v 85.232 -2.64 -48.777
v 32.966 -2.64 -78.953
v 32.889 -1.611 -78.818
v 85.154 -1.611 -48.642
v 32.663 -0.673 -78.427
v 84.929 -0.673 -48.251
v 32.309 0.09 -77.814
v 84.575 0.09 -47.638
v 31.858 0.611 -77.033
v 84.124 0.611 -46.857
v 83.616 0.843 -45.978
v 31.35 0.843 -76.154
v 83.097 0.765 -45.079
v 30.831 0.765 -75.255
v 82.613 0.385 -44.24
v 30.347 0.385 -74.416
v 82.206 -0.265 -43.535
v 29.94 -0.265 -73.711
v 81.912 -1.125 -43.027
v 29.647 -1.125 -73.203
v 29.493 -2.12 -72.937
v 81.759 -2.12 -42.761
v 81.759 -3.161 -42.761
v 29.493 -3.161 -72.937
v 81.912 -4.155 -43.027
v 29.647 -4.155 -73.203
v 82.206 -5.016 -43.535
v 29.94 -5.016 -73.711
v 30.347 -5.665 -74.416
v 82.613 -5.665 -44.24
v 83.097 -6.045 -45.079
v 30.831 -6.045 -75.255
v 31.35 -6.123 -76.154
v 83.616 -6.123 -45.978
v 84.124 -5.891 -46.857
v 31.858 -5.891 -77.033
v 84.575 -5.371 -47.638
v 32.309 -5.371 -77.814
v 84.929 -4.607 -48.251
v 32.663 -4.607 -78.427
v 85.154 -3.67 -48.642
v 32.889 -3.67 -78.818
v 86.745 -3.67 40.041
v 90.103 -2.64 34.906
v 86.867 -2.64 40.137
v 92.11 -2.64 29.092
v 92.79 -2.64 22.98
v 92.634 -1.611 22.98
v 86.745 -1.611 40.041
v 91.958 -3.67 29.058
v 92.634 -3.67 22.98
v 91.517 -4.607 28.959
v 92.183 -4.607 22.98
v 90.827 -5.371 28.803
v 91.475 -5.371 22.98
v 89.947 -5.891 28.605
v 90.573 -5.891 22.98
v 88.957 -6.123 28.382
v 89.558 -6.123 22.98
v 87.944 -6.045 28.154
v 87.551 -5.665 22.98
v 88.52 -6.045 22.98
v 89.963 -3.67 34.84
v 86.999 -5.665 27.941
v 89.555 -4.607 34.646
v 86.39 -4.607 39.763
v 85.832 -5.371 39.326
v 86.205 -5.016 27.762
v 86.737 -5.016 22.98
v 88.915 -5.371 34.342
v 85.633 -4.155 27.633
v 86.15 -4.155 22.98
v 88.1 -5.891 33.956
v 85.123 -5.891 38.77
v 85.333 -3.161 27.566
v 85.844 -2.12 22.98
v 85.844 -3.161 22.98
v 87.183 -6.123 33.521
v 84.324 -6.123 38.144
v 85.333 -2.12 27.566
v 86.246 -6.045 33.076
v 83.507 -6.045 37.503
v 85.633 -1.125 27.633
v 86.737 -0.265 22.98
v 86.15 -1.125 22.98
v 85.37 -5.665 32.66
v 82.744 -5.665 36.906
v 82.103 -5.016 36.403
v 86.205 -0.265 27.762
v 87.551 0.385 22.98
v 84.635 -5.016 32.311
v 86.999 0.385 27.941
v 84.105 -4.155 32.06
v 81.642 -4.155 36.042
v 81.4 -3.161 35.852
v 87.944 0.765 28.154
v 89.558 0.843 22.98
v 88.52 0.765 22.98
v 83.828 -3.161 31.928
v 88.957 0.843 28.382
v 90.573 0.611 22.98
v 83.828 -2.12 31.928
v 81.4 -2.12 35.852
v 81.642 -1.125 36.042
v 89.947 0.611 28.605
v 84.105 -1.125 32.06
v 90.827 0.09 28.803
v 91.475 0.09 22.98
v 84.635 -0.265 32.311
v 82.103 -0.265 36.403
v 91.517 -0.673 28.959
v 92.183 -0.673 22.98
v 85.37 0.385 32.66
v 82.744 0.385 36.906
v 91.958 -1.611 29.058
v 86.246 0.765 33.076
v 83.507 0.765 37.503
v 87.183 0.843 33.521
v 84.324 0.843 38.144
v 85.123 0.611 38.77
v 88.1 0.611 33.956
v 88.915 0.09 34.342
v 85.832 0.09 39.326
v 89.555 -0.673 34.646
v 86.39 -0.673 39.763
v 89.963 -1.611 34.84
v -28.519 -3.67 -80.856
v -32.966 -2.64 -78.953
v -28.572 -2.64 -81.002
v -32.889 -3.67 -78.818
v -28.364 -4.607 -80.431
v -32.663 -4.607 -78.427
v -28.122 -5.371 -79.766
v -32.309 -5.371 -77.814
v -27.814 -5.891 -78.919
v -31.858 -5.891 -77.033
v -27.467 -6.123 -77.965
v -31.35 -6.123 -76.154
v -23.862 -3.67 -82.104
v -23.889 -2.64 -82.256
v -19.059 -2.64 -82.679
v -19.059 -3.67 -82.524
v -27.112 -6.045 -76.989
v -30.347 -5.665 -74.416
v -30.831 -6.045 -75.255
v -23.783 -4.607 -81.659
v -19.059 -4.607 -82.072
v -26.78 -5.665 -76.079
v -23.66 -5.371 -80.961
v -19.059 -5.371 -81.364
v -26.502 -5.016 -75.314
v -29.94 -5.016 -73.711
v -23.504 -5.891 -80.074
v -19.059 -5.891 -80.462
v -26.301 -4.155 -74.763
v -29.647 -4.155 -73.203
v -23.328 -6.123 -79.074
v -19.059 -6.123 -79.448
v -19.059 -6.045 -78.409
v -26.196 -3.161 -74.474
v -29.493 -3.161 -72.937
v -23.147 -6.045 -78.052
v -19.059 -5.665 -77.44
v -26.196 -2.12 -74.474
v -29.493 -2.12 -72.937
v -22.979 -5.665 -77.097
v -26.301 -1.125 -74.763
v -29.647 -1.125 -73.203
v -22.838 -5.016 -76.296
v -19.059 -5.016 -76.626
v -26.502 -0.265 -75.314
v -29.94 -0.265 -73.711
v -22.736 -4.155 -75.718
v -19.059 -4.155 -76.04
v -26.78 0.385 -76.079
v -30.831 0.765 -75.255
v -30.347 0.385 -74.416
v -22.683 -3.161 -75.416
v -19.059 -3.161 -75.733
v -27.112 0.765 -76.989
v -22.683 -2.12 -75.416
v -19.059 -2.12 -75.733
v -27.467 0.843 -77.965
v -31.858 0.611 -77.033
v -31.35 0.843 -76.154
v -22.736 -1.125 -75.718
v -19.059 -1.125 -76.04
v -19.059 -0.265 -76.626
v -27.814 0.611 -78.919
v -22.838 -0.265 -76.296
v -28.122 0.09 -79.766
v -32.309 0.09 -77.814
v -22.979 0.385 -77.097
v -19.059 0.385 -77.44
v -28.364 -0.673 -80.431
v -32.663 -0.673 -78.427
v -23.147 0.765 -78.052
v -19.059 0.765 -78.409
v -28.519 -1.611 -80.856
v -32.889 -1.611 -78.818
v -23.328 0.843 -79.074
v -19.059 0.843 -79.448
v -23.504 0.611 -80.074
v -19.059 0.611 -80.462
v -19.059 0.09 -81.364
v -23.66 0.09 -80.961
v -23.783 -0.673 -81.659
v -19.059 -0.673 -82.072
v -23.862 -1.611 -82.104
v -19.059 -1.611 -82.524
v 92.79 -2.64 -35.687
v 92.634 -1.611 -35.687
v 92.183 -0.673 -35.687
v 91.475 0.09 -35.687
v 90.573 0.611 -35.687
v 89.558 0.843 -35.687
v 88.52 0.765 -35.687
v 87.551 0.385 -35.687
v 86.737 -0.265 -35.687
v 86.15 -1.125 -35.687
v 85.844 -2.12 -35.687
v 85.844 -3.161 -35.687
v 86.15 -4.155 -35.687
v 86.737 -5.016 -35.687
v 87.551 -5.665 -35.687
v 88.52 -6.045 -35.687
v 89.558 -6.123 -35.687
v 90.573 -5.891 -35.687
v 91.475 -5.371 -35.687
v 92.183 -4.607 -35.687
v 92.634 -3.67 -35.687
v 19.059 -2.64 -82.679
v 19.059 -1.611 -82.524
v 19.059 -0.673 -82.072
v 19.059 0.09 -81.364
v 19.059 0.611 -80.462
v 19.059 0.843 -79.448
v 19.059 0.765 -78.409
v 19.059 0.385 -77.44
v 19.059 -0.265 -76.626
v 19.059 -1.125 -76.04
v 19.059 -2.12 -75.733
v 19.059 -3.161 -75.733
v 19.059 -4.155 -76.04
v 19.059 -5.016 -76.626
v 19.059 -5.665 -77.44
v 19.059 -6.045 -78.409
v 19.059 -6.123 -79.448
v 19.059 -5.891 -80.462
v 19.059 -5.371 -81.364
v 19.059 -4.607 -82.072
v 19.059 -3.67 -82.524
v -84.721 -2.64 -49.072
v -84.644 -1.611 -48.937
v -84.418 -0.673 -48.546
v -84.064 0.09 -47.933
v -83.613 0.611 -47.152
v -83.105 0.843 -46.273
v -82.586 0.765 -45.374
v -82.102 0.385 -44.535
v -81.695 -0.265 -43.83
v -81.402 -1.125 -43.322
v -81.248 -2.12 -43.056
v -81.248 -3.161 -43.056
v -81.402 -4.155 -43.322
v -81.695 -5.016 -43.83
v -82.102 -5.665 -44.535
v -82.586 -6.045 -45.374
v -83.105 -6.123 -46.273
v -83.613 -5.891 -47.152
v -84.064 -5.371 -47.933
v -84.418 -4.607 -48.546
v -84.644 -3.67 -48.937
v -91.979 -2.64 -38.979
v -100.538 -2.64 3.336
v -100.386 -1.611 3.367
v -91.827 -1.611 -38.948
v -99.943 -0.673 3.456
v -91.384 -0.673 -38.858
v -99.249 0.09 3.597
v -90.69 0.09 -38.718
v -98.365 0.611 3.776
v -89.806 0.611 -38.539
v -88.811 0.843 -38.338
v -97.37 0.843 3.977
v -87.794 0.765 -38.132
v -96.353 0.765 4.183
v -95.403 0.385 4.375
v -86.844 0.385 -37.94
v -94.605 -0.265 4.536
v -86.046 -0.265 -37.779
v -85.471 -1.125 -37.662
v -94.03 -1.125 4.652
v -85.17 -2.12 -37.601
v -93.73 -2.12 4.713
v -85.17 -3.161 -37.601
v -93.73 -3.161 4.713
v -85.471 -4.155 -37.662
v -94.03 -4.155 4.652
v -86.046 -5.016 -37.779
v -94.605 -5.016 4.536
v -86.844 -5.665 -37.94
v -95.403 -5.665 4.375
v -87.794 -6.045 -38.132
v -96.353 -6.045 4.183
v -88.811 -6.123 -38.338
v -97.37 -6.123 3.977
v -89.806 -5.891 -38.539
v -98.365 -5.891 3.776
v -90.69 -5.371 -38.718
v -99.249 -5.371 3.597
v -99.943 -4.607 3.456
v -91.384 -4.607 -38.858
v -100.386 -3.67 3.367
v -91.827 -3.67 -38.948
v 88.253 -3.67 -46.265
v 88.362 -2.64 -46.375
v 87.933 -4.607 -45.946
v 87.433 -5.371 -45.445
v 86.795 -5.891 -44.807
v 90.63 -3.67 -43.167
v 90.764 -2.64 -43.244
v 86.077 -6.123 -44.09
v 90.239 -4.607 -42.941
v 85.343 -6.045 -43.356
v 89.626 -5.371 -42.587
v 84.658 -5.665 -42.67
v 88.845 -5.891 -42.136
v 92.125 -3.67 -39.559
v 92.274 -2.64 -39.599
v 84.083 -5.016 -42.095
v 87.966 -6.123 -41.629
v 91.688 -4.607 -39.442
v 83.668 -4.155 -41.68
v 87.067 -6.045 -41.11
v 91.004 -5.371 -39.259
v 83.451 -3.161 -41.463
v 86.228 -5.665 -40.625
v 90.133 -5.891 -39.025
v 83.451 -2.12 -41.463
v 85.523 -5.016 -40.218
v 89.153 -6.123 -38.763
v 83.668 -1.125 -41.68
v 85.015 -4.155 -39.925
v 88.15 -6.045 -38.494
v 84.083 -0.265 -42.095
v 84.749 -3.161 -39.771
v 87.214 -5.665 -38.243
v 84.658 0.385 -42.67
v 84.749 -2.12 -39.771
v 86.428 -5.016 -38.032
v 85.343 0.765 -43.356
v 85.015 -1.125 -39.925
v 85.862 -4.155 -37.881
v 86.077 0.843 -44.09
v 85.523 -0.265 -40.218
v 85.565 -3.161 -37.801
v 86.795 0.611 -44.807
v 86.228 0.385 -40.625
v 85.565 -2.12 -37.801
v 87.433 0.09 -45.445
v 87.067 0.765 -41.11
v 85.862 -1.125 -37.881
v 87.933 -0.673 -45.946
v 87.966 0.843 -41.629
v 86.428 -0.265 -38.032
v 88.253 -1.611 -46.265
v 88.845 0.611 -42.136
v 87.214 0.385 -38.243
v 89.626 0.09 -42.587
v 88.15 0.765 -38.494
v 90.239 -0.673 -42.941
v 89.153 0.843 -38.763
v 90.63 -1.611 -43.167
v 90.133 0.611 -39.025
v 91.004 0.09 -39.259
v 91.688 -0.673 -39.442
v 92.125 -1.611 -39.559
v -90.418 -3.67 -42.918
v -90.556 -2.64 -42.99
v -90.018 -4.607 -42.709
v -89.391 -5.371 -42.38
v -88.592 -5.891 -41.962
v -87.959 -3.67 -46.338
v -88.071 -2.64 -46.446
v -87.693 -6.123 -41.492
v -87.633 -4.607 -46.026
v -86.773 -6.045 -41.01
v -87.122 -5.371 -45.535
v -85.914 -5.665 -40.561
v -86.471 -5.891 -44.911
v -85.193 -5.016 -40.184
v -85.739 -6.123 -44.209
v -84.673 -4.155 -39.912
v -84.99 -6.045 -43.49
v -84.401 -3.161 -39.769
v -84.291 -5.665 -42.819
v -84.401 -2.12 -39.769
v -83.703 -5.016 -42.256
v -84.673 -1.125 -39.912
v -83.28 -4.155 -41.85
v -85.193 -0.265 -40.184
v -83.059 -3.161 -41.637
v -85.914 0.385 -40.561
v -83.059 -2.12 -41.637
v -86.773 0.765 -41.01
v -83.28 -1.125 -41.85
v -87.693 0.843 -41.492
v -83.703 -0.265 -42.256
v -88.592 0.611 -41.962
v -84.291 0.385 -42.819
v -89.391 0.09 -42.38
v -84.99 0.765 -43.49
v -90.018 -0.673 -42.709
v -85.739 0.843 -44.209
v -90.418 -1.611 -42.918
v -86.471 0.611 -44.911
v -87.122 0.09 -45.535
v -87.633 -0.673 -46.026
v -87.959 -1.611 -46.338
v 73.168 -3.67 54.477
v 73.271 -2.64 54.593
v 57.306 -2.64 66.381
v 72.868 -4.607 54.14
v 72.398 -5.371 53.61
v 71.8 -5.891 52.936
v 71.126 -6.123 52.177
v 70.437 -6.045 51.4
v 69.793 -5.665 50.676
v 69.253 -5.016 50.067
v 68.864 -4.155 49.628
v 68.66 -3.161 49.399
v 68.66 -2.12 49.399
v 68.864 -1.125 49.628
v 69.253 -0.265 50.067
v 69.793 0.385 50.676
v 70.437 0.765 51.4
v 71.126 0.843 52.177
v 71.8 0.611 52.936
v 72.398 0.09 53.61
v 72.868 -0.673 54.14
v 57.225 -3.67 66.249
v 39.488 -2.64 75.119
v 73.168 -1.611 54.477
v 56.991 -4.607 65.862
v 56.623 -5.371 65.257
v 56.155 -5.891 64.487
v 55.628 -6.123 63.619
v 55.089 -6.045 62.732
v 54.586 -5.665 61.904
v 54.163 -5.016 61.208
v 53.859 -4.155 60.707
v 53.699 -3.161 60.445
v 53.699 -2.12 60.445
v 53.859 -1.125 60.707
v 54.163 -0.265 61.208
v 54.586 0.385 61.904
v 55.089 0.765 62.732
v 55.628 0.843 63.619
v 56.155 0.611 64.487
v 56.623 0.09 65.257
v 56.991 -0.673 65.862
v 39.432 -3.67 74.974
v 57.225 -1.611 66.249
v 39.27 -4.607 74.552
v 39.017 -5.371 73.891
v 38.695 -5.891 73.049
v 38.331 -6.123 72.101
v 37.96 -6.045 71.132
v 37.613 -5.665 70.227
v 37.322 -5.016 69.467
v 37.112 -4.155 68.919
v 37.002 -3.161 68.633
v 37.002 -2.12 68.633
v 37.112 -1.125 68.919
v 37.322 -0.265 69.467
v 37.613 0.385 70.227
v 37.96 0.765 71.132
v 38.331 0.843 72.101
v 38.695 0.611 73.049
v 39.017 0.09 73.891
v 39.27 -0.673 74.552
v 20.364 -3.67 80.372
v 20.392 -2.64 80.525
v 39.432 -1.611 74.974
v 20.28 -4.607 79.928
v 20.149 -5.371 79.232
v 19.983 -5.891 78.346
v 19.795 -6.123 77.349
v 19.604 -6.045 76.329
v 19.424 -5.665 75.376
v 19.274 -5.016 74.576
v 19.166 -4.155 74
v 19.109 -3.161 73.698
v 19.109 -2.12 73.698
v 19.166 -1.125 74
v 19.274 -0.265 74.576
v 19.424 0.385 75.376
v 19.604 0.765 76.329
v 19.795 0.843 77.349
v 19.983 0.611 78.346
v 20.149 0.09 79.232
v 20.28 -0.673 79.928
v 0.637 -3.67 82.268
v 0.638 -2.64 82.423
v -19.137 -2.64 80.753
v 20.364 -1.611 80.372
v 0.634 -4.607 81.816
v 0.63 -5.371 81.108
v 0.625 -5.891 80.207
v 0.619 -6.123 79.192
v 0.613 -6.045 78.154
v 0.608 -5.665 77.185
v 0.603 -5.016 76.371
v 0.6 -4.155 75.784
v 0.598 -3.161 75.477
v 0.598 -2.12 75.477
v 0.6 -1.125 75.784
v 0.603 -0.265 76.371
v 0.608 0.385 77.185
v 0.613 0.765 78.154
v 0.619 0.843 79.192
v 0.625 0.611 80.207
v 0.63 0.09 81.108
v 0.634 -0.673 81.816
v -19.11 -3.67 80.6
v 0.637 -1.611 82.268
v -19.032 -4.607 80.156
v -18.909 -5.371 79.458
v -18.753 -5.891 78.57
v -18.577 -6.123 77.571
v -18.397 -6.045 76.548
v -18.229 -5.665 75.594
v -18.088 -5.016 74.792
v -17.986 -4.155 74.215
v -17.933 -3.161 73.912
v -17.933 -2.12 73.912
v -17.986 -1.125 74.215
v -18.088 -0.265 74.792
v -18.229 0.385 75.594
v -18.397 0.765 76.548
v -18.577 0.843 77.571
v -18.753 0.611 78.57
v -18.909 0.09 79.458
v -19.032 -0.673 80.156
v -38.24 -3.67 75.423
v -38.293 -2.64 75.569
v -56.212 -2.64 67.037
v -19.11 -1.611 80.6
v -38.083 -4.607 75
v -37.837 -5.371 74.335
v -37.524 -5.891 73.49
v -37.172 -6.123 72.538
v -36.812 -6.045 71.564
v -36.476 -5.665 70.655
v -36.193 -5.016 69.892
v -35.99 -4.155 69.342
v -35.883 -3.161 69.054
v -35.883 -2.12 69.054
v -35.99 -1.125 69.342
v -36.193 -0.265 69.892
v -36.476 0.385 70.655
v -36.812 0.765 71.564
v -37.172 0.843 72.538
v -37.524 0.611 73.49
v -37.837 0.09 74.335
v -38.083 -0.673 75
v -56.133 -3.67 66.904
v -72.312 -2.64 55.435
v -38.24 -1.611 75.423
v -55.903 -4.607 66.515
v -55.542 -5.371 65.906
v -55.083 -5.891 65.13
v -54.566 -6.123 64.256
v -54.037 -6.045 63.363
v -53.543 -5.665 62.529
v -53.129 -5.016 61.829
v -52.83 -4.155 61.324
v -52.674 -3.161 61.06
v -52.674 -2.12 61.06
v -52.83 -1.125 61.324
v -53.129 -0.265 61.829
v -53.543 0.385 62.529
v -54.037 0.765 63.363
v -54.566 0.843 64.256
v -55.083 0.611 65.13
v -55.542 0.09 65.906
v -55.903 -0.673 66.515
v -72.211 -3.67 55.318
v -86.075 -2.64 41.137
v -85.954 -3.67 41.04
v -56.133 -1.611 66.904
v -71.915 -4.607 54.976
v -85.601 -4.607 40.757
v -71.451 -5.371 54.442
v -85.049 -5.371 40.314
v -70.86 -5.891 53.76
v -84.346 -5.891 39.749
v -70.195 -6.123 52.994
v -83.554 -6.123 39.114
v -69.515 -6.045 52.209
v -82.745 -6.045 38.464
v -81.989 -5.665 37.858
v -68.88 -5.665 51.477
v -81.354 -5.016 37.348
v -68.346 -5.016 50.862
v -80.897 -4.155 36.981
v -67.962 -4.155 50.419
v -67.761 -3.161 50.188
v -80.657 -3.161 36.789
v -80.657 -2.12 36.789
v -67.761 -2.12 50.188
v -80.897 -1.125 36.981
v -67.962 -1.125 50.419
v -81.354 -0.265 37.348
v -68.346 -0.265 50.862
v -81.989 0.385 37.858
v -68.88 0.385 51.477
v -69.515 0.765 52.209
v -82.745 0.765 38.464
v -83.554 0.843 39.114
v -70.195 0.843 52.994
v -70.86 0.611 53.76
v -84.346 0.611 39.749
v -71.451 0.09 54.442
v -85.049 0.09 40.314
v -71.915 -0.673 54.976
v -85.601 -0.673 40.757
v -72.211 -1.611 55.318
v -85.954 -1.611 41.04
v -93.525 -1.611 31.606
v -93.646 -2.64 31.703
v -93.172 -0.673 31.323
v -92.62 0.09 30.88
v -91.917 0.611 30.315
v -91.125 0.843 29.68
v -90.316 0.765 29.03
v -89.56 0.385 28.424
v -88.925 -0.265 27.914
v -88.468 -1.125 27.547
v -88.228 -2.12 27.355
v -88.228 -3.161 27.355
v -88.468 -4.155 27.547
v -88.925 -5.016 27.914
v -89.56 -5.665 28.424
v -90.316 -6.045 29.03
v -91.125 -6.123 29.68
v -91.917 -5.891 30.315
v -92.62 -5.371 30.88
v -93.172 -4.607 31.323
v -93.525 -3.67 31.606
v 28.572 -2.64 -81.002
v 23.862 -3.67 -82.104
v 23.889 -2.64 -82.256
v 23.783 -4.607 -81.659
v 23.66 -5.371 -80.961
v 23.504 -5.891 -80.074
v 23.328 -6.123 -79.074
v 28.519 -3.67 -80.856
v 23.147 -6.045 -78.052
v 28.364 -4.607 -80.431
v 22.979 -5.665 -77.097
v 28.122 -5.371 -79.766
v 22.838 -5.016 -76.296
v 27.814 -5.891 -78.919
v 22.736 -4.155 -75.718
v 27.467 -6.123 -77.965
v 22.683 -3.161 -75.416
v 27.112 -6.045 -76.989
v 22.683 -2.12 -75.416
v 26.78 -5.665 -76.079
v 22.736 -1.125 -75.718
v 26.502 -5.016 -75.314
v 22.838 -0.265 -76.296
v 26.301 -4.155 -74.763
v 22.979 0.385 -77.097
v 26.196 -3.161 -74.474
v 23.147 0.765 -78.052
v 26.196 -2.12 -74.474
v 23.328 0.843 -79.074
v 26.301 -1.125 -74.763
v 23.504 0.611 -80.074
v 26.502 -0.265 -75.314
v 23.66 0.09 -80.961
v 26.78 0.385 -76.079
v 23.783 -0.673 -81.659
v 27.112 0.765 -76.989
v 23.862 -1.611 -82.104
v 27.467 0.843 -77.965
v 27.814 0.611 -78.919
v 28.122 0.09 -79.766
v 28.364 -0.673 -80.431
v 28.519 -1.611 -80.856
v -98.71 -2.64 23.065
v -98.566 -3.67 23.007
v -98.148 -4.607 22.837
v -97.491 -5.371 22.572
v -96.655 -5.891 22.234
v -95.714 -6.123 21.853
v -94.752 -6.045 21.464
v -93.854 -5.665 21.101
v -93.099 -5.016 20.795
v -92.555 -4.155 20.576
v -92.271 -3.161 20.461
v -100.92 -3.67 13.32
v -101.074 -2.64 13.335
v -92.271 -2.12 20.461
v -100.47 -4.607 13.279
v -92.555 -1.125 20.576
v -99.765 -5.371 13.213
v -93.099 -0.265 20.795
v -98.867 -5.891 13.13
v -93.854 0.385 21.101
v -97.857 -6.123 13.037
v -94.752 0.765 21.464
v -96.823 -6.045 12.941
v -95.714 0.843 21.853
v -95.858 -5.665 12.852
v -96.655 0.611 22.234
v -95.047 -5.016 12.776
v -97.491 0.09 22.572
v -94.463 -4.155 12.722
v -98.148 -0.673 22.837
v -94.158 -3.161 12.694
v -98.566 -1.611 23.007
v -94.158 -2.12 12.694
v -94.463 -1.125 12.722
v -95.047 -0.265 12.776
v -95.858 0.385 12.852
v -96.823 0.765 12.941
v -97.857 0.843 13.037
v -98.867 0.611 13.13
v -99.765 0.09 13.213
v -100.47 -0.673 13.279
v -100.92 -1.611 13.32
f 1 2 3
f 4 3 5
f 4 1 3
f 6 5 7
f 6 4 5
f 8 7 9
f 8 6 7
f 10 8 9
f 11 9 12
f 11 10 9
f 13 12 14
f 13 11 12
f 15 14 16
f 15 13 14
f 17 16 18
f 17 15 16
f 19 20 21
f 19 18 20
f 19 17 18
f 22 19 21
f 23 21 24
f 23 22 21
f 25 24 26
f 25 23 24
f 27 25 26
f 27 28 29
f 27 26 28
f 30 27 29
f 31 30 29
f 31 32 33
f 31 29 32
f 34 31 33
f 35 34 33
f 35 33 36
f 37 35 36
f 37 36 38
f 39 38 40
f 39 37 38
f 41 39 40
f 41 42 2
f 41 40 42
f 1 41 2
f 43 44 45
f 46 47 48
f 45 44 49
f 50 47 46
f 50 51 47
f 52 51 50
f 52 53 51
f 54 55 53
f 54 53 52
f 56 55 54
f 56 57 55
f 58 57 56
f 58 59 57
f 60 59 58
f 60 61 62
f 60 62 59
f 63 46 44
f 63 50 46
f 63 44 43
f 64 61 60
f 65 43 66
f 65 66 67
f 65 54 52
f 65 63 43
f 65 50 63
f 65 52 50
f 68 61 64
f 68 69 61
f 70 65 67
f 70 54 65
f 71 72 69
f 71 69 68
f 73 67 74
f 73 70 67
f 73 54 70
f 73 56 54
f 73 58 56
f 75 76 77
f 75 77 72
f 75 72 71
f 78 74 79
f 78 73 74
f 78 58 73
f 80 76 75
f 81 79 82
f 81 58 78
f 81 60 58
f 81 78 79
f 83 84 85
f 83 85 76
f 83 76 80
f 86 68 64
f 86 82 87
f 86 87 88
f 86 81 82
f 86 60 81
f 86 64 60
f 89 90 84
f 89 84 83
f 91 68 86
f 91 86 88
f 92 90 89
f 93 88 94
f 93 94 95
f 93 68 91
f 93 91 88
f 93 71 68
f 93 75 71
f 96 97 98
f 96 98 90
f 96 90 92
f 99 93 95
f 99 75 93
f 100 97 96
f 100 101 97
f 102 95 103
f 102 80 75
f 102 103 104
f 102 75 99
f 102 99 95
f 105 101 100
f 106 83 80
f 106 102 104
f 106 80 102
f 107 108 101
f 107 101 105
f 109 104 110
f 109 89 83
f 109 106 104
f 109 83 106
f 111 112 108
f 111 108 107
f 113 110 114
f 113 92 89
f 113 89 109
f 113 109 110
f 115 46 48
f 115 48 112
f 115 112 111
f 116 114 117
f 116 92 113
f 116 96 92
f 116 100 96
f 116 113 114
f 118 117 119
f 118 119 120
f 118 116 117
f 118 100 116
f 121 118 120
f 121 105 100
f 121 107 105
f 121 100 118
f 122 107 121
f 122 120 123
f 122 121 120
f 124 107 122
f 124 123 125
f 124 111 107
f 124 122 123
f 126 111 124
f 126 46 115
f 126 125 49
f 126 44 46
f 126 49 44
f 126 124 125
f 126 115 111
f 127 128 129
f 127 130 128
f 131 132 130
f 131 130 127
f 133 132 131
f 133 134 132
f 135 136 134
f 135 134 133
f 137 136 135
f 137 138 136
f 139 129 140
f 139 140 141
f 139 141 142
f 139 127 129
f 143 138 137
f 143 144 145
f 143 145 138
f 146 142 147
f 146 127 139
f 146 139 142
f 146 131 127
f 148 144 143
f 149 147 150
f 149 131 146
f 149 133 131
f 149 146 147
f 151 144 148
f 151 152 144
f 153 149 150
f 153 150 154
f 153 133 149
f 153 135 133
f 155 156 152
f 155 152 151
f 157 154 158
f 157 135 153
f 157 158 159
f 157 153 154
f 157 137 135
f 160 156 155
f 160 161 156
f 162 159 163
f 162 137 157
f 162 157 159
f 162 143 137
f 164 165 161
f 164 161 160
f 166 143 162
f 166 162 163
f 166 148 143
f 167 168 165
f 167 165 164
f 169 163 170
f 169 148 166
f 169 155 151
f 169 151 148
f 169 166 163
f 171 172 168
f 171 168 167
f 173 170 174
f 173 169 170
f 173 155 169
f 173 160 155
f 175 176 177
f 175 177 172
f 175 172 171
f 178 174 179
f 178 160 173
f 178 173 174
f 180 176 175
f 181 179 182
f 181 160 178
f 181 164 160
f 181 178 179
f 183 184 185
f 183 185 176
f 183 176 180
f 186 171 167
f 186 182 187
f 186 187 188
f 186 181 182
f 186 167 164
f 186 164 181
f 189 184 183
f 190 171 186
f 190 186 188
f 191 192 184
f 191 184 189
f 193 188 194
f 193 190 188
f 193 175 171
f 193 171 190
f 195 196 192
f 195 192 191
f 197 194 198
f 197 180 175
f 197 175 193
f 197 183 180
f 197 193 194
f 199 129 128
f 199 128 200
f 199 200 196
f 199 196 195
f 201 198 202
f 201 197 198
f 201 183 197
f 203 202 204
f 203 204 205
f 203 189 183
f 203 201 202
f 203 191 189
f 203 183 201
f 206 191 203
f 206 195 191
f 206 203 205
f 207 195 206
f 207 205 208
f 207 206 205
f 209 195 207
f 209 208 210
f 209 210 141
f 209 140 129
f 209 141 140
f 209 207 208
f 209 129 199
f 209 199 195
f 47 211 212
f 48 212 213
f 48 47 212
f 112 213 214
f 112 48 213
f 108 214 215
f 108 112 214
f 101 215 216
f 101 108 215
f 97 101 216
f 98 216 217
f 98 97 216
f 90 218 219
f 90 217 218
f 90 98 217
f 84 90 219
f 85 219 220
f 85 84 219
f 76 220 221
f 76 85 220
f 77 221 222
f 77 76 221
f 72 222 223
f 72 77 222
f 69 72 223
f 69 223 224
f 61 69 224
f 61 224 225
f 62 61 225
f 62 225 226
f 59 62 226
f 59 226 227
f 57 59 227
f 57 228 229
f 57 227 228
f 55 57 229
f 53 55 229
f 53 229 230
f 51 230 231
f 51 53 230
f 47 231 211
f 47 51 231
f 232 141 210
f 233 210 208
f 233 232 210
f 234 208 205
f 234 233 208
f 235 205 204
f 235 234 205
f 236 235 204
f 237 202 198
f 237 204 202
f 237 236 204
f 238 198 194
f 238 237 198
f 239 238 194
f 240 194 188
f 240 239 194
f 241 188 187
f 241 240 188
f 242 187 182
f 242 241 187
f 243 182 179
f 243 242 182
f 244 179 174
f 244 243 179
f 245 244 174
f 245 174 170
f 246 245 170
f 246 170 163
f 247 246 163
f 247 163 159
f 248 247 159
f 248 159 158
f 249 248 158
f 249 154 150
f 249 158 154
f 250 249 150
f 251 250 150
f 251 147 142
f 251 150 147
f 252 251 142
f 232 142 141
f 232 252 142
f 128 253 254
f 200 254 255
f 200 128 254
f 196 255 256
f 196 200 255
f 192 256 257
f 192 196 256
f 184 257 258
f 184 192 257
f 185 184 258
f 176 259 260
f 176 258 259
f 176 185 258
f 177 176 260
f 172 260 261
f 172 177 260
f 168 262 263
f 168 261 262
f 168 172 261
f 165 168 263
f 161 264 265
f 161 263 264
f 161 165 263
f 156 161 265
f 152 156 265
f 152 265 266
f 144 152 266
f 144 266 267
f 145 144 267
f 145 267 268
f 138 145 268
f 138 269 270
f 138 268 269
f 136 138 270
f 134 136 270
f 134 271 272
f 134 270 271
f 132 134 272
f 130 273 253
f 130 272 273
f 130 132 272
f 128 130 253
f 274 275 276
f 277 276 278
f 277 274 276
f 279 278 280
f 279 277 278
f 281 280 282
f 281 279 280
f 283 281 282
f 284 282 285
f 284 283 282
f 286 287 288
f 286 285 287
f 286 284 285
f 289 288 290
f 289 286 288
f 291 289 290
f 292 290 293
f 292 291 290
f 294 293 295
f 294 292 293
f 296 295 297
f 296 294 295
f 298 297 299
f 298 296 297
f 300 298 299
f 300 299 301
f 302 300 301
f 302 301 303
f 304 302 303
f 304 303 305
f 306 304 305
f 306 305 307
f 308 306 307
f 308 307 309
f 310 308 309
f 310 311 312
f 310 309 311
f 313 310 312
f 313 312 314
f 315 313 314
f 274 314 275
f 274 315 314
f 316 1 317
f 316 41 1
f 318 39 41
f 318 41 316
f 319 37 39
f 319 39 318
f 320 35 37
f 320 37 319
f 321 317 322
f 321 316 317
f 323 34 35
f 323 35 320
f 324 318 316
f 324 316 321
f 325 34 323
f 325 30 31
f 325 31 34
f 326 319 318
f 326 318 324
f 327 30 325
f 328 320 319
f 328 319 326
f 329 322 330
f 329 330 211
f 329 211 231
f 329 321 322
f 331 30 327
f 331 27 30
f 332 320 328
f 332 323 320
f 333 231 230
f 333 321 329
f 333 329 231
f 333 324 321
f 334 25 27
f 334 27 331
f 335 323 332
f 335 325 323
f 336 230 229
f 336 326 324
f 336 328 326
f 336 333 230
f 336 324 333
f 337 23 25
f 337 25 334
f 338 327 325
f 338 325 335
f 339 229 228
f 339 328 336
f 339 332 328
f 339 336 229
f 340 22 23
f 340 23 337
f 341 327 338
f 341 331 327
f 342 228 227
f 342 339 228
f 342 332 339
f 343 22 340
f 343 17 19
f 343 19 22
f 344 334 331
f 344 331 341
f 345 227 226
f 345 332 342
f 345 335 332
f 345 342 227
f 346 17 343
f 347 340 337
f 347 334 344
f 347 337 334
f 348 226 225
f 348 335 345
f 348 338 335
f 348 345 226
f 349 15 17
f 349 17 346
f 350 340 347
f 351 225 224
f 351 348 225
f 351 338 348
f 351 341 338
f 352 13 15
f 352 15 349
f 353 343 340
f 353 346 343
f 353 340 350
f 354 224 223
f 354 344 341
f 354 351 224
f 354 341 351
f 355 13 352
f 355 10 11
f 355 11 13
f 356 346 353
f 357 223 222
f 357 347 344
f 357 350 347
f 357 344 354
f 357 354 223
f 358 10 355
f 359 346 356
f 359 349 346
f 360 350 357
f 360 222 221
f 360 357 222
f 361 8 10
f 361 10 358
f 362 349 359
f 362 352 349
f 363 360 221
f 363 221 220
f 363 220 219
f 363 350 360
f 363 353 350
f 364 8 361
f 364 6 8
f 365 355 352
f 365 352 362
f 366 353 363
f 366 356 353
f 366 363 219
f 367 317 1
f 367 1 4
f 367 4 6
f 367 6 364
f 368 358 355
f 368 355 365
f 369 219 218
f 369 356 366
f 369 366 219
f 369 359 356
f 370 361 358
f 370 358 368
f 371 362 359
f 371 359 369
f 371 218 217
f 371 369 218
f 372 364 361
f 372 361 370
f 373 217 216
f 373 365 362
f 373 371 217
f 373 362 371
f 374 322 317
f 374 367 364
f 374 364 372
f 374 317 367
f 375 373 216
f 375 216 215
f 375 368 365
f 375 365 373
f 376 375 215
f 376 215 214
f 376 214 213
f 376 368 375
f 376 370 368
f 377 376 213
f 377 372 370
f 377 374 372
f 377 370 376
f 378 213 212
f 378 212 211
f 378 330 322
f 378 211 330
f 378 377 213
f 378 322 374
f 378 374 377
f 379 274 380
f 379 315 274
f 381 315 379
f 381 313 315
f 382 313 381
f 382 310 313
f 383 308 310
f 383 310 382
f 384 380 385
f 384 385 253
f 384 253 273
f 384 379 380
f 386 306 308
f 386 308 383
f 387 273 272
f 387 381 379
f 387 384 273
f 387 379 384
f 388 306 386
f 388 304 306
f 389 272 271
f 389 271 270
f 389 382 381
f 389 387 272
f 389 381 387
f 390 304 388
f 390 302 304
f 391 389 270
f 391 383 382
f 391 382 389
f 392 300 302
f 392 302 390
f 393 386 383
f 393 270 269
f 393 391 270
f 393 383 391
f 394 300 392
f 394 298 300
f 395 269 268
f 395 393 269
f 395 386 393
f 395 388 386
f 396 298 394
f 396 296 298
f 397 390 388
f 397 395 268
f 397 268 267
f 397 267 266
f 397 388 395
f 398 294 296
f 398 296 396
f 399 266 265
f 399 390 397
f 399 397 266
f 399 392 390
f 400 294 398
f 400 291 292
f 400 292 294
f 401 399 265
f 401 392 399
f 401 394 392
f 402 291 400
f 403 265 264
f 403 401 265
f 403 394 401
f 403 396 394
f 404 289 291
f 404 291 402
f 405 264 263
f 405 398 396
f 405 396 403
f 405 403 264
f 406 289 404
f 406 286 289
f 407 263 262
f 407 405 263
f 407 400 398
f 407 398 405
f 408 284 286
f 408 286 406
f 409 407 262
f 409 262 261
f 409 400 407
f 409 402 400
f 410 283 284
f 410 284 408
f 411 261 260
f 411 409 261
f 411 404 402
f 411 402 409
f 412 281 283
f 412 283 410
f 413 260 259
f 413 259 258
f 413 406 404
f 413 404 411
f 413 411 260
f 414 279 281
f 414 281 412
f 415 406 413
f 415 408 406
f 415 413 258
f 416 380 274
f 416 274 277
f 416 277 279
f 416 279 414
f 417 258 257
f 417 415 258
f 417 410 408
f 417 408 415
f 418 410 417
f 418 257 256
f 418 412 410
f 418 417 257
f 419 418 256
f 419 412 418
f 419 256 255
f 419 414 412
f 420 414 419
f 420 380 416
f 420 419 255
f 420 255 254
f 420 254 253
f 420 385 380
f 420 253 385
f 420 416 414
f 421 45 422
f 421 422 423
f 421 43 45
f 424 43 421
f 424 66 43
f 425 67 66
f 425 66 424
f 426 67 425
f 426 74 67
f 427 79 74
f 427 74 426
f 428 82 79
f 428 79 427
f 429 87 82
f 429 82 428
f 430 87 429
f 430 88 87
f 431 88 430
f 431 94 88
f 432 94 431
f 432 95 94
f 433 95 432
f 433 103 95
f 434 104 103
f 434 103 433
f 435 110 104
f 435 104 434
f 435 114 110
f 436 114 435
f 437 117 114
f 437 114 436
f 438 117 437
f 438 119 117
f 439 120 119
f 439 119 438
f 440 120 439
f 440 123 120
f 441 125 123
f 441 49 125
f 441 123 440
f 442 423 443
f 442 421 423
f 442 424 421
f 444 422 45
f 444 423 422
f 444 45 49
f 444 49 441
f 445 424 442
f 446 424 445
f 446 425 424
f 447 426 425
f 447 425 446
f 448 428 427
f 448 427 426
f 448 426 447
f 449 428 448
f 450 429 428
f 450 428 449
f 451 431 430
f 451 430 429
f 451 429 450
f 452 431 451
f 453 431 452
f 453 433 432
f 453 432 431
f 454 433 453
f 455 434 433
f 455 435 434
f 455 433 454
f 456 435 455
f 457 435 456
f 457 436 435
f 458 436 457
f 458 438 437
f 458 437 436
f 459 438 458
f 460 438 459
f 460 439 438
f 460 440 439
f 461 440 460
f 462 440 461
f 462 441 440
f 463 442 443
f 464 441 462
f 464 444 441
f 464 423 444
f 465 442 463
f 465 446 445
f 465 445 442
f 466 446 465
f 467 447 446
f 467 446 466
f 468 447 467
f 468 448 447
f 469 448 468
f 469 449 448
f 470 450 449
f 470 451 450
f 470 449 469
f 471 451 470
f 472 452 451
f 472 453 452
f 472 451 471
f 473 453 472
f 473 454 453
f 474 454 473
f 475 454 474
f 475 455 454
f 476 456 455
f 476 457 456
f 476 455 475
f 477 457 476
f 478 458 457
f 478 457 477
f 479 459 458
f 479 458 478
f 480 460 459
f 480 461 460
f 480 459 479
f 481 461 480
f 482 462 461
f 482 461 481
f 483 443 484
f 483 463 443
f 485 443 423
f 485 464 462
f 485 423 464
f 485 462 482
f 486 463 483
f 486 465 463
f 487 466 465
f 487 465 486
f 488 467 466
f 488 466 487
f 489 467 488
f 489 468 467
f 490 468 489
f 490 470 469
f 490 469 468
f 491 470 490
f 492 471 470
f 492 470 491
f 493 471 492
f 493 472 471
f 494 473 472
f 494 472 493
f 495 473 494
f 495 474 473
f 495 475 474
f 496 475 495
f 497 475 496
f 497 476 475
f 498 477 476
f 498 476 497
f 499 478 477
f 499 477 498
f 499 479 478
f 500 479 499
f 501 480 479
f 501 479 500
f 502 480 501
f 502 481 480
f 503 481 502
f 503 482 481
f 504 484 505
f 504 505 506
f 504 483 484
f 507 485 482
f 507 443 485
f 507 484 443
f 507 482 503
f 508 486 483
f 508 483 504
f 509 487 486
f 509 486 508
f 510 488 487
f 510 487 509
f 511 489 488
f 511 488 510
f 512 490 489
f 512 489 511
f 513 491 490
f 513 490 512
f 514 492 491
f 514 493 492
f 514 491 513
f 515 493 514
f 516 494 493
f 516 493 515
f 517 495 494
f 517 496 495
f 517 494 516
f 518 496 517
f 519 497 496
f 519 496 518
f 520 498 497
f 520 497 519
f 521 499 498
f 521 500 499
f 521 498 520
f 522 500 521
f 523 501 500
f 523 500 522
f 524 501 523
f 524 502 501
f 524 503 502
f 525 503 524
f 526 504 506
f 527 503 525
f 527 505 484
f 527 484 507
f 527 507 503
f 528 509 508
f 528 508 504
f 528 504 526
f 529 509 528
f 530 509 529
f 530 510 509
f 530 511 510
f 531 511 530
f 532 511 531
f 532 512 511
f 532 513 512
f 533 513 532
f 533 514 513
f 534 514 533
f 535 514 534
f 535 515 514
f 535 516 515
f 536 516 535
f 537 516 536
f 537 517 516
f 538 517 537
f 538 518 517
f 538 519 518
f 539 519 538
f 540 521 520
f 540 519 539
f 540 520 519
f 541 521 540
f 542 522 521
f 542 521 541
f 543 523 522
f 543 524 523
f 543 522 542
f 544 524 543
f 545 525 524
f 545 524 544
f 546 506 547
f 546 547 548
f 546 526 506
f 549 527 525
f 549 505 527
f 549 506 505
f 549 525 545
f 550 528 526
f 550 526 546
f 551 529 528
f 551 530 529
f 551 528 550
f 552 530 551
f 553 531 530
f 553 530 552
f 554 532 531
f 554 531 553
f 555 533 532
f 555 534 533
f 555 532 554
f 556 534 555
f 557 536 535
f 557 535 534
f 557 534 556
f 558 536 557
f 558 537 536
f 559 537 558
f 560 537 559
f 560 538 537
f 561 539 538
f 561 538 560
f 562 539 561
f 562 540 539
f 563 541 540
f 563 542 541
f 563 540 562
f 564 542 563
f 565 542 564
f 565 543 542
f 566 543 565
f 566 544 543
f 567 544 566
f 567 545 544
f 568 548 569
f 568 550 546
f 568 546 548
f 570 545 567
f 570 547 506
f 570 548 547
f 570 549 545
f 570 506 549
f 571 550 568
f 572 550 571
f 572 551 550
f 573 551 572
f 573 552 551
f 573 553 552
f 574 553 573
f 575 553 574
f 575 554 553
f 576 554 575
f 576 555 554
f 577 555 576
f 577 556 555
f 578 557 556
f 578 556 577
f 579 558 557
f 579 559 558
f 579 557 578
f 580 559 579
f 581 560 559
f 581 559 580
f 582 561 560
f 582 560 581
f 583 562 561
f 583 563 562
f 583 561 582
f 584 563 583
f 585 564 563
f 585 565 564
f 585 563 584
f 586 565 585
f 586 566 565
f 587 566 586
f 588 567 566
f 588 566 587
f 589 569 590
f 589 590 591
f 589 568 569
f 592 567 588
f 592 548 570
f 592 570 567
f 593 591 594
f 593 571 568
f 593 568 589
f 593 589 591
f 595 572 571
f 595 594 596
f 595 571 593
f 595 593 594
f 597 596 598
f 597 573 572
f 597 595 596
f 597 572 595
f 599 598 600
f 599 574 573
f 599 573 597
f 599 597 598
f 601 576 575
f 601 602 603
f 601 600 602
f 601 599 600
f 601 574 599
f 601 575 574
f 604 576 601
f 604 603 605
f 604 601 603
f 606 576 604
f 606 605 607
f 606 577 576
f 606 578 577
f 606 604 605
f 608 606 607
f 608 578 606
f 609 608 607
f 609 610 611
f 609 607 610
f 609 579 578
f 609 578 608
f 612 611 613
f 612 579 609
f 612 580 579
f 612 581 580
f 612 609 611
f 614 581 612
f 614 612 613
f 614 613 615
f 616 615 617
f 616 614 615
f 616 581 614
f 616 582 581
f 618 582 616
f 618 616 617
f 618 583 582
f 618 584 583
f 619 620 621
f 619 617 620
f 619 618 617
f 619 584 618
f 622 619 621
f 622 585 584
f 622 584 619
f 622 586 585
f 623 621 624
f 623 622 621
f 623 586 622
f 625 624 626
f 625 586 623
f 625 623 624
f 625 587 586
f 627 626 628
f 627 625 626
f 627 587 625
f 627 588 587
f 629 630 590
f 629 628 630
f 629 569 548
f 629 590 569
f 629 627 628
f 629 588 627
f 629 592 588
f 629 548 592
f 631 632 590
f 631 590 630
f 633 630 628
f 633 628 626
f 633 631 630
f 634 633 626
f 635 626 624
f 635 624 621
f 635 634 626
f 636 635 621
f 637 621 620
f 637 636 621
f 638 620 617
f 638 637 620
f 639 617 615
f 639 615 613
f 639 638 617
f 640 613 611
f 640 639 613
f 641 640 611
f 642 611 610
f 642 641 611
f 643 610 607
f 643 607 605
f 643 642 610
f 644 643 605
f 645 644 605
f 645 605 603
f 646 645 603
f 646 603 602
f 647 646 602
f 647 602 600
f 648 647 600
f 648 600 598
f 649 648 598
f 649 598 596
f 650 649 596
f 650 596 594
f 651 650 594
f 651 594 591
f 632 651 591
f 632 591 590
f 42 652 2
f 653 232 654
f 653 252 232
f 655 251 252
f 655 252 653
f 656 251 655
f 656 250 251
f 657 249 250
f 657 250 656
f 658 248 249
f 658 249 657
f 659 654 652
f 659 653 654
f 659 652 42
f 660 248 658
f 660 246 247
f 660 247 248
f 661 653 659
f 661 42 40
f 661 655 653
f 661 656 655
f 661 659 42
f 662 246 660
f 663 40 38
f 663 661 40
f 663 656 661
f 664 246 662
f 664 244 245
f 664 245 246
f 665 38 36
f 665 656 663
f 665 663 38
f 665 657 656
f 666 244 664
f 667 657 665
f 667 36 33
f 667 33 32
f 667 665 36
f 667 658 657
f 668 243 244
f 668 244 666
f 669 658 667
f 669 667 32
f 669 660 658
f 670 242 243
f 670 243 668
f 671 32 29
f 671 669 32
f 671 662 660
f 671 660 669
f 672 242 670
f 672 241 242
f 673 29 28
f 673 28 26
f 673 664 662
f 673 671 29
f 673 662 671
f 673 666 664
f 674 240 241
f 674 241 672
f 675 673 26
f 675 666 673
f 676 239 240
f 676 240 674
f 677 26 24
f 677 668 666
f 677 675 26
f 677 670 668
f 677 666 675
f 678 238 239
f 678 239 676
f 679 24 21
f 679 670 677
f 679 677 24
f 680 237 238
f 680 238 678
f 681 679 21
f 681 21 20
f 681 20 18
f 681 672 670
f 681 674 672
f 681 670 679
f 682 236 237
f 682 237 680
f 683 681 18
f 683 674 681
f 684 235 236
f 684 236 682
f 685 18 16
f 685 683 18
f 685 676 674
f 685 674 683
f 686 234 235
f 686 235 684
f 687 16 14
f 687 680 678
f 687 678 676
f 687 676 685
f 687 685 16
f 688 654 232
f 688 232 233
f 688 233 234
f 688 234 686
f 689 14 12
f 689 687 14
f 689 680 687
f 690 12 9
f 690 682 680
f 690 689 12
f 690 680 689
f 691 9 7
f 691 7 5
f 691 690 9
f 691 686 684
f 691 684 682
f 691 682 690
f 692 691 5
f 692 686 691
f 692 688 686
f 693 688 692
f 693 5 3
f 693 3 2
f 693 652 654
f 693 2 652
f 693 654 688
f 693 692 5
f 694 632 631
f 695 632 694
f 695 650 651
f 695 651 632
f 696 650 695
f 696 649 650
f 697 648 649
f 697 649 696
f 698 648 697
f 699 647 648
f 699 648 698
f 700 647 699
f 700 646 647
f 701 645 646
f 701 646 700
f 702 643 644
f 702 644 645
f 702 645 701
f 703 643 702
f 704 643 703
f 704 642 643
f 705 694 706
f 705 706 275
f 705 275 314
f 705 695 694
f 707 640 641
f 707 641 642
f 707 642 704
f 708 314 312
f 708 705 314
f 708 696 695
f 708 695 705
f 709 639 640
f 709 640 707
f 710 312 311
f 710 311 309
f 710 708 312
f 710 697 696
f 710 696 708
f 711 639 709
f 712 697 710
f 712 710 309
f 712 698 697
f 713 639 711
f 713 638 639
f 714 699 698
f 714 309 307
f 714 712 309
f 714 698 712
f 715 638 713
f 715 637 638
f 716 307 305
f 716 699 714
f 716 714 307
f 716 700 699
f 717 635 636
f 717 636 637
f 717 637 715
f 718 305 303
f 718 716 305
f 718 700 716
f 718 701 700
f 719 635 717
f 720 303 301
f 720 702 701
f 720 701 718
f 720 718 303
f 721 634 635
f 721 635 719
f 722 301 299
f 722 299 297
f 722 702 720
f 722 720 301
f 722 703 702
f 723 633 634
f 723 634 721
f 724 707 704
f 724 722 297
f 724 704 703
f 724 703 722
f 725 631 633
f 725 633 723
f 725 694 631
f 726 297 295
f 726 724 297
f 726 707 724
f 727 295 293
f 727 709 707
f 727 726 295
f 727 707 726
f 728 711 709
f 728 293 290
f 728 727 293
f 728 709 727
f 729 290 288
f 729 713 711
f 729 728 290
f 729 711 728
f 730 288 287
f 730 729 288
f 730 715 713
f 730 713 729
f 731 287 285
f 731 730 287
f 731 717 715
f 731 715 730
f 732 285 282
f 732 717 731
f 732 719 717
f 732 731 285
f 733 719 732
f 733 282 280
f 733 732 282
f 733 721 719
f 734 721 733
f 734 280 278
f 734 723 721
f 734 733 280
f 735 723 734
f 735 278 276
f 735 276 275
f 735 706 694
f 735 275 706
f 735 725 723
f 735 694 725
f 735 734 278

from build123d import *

# Parameters (mm, degrees)
SKETCH2_R = 3.4925


with BuildPart() as part:
    # Sweep1: sweep along a path in Sketch1
    with BuildLine(Plane(origin=(0, -2.640079968, 0), x_dir=(-1, 0, 0), z_dir=(0, -1, 0))) as sweep1_path:
        Line((83.350830382, -38.950762016), (90.921866986, -29.516691169))
        ThreePointArc((90.921866986, -29.516691169), (96.854212201, -17.461644901), (97.114610152, -4.028512237))
        Line((97.114610152, -4.028512237), (88.555415825, 38.286098976))
        ThreePointArc((88.555415825, 38.286098976), (86.599981286, 42.766938519), (82.974870066, 46.04721532))
        Line((82.974870066, 46.04721532), (31.21997499, 75.927917924))
        ThreePointArc((31.21997499, 75.927917924), (25.353847026, 78.357747685), (19.058716307, 79.186517367))
        Line((19.058716307, 79.186517367), (-19.058716307, 79.186517367))
        ThreePointArc((-19.058716307, 79.186517367), (-25.353847026, 78.357747685), (-31.21997499, 75.927917924))
        Line((-31.21997499, 75.927917924), (-83.485748808, 45.752259341))
        ThreePointArc((-83.485748808, 45.752259341), (-87.73988542, 41.498122729), (-89.297007491, 35.686864045))
        Line((-89.297007491, 35.686864045), (-89.297007491, -22.979722438))
        ThreePointArc((-89.297007491, -22.979722438), (-87.965976384, -30.91549024), (-84.118562377, -37.98270043))
        ThreePointArc((-84.118562377, -37.98270043), (-0.617769304, -78.930731865), (83.350830382, -38.950762016))
    # Sketch2 → Sweep1 (sweep)
    with BuildSketch(Plane(origin=(0, 0, 0), x_dir=(0, 0, -1), z_dir=(1, 0, 0))):
        with Locations((79.186517367, -2.640079968)):
            Circle(SKETCH2_R)
    sweep(path=sweep1_path.line)


solid = part.part
